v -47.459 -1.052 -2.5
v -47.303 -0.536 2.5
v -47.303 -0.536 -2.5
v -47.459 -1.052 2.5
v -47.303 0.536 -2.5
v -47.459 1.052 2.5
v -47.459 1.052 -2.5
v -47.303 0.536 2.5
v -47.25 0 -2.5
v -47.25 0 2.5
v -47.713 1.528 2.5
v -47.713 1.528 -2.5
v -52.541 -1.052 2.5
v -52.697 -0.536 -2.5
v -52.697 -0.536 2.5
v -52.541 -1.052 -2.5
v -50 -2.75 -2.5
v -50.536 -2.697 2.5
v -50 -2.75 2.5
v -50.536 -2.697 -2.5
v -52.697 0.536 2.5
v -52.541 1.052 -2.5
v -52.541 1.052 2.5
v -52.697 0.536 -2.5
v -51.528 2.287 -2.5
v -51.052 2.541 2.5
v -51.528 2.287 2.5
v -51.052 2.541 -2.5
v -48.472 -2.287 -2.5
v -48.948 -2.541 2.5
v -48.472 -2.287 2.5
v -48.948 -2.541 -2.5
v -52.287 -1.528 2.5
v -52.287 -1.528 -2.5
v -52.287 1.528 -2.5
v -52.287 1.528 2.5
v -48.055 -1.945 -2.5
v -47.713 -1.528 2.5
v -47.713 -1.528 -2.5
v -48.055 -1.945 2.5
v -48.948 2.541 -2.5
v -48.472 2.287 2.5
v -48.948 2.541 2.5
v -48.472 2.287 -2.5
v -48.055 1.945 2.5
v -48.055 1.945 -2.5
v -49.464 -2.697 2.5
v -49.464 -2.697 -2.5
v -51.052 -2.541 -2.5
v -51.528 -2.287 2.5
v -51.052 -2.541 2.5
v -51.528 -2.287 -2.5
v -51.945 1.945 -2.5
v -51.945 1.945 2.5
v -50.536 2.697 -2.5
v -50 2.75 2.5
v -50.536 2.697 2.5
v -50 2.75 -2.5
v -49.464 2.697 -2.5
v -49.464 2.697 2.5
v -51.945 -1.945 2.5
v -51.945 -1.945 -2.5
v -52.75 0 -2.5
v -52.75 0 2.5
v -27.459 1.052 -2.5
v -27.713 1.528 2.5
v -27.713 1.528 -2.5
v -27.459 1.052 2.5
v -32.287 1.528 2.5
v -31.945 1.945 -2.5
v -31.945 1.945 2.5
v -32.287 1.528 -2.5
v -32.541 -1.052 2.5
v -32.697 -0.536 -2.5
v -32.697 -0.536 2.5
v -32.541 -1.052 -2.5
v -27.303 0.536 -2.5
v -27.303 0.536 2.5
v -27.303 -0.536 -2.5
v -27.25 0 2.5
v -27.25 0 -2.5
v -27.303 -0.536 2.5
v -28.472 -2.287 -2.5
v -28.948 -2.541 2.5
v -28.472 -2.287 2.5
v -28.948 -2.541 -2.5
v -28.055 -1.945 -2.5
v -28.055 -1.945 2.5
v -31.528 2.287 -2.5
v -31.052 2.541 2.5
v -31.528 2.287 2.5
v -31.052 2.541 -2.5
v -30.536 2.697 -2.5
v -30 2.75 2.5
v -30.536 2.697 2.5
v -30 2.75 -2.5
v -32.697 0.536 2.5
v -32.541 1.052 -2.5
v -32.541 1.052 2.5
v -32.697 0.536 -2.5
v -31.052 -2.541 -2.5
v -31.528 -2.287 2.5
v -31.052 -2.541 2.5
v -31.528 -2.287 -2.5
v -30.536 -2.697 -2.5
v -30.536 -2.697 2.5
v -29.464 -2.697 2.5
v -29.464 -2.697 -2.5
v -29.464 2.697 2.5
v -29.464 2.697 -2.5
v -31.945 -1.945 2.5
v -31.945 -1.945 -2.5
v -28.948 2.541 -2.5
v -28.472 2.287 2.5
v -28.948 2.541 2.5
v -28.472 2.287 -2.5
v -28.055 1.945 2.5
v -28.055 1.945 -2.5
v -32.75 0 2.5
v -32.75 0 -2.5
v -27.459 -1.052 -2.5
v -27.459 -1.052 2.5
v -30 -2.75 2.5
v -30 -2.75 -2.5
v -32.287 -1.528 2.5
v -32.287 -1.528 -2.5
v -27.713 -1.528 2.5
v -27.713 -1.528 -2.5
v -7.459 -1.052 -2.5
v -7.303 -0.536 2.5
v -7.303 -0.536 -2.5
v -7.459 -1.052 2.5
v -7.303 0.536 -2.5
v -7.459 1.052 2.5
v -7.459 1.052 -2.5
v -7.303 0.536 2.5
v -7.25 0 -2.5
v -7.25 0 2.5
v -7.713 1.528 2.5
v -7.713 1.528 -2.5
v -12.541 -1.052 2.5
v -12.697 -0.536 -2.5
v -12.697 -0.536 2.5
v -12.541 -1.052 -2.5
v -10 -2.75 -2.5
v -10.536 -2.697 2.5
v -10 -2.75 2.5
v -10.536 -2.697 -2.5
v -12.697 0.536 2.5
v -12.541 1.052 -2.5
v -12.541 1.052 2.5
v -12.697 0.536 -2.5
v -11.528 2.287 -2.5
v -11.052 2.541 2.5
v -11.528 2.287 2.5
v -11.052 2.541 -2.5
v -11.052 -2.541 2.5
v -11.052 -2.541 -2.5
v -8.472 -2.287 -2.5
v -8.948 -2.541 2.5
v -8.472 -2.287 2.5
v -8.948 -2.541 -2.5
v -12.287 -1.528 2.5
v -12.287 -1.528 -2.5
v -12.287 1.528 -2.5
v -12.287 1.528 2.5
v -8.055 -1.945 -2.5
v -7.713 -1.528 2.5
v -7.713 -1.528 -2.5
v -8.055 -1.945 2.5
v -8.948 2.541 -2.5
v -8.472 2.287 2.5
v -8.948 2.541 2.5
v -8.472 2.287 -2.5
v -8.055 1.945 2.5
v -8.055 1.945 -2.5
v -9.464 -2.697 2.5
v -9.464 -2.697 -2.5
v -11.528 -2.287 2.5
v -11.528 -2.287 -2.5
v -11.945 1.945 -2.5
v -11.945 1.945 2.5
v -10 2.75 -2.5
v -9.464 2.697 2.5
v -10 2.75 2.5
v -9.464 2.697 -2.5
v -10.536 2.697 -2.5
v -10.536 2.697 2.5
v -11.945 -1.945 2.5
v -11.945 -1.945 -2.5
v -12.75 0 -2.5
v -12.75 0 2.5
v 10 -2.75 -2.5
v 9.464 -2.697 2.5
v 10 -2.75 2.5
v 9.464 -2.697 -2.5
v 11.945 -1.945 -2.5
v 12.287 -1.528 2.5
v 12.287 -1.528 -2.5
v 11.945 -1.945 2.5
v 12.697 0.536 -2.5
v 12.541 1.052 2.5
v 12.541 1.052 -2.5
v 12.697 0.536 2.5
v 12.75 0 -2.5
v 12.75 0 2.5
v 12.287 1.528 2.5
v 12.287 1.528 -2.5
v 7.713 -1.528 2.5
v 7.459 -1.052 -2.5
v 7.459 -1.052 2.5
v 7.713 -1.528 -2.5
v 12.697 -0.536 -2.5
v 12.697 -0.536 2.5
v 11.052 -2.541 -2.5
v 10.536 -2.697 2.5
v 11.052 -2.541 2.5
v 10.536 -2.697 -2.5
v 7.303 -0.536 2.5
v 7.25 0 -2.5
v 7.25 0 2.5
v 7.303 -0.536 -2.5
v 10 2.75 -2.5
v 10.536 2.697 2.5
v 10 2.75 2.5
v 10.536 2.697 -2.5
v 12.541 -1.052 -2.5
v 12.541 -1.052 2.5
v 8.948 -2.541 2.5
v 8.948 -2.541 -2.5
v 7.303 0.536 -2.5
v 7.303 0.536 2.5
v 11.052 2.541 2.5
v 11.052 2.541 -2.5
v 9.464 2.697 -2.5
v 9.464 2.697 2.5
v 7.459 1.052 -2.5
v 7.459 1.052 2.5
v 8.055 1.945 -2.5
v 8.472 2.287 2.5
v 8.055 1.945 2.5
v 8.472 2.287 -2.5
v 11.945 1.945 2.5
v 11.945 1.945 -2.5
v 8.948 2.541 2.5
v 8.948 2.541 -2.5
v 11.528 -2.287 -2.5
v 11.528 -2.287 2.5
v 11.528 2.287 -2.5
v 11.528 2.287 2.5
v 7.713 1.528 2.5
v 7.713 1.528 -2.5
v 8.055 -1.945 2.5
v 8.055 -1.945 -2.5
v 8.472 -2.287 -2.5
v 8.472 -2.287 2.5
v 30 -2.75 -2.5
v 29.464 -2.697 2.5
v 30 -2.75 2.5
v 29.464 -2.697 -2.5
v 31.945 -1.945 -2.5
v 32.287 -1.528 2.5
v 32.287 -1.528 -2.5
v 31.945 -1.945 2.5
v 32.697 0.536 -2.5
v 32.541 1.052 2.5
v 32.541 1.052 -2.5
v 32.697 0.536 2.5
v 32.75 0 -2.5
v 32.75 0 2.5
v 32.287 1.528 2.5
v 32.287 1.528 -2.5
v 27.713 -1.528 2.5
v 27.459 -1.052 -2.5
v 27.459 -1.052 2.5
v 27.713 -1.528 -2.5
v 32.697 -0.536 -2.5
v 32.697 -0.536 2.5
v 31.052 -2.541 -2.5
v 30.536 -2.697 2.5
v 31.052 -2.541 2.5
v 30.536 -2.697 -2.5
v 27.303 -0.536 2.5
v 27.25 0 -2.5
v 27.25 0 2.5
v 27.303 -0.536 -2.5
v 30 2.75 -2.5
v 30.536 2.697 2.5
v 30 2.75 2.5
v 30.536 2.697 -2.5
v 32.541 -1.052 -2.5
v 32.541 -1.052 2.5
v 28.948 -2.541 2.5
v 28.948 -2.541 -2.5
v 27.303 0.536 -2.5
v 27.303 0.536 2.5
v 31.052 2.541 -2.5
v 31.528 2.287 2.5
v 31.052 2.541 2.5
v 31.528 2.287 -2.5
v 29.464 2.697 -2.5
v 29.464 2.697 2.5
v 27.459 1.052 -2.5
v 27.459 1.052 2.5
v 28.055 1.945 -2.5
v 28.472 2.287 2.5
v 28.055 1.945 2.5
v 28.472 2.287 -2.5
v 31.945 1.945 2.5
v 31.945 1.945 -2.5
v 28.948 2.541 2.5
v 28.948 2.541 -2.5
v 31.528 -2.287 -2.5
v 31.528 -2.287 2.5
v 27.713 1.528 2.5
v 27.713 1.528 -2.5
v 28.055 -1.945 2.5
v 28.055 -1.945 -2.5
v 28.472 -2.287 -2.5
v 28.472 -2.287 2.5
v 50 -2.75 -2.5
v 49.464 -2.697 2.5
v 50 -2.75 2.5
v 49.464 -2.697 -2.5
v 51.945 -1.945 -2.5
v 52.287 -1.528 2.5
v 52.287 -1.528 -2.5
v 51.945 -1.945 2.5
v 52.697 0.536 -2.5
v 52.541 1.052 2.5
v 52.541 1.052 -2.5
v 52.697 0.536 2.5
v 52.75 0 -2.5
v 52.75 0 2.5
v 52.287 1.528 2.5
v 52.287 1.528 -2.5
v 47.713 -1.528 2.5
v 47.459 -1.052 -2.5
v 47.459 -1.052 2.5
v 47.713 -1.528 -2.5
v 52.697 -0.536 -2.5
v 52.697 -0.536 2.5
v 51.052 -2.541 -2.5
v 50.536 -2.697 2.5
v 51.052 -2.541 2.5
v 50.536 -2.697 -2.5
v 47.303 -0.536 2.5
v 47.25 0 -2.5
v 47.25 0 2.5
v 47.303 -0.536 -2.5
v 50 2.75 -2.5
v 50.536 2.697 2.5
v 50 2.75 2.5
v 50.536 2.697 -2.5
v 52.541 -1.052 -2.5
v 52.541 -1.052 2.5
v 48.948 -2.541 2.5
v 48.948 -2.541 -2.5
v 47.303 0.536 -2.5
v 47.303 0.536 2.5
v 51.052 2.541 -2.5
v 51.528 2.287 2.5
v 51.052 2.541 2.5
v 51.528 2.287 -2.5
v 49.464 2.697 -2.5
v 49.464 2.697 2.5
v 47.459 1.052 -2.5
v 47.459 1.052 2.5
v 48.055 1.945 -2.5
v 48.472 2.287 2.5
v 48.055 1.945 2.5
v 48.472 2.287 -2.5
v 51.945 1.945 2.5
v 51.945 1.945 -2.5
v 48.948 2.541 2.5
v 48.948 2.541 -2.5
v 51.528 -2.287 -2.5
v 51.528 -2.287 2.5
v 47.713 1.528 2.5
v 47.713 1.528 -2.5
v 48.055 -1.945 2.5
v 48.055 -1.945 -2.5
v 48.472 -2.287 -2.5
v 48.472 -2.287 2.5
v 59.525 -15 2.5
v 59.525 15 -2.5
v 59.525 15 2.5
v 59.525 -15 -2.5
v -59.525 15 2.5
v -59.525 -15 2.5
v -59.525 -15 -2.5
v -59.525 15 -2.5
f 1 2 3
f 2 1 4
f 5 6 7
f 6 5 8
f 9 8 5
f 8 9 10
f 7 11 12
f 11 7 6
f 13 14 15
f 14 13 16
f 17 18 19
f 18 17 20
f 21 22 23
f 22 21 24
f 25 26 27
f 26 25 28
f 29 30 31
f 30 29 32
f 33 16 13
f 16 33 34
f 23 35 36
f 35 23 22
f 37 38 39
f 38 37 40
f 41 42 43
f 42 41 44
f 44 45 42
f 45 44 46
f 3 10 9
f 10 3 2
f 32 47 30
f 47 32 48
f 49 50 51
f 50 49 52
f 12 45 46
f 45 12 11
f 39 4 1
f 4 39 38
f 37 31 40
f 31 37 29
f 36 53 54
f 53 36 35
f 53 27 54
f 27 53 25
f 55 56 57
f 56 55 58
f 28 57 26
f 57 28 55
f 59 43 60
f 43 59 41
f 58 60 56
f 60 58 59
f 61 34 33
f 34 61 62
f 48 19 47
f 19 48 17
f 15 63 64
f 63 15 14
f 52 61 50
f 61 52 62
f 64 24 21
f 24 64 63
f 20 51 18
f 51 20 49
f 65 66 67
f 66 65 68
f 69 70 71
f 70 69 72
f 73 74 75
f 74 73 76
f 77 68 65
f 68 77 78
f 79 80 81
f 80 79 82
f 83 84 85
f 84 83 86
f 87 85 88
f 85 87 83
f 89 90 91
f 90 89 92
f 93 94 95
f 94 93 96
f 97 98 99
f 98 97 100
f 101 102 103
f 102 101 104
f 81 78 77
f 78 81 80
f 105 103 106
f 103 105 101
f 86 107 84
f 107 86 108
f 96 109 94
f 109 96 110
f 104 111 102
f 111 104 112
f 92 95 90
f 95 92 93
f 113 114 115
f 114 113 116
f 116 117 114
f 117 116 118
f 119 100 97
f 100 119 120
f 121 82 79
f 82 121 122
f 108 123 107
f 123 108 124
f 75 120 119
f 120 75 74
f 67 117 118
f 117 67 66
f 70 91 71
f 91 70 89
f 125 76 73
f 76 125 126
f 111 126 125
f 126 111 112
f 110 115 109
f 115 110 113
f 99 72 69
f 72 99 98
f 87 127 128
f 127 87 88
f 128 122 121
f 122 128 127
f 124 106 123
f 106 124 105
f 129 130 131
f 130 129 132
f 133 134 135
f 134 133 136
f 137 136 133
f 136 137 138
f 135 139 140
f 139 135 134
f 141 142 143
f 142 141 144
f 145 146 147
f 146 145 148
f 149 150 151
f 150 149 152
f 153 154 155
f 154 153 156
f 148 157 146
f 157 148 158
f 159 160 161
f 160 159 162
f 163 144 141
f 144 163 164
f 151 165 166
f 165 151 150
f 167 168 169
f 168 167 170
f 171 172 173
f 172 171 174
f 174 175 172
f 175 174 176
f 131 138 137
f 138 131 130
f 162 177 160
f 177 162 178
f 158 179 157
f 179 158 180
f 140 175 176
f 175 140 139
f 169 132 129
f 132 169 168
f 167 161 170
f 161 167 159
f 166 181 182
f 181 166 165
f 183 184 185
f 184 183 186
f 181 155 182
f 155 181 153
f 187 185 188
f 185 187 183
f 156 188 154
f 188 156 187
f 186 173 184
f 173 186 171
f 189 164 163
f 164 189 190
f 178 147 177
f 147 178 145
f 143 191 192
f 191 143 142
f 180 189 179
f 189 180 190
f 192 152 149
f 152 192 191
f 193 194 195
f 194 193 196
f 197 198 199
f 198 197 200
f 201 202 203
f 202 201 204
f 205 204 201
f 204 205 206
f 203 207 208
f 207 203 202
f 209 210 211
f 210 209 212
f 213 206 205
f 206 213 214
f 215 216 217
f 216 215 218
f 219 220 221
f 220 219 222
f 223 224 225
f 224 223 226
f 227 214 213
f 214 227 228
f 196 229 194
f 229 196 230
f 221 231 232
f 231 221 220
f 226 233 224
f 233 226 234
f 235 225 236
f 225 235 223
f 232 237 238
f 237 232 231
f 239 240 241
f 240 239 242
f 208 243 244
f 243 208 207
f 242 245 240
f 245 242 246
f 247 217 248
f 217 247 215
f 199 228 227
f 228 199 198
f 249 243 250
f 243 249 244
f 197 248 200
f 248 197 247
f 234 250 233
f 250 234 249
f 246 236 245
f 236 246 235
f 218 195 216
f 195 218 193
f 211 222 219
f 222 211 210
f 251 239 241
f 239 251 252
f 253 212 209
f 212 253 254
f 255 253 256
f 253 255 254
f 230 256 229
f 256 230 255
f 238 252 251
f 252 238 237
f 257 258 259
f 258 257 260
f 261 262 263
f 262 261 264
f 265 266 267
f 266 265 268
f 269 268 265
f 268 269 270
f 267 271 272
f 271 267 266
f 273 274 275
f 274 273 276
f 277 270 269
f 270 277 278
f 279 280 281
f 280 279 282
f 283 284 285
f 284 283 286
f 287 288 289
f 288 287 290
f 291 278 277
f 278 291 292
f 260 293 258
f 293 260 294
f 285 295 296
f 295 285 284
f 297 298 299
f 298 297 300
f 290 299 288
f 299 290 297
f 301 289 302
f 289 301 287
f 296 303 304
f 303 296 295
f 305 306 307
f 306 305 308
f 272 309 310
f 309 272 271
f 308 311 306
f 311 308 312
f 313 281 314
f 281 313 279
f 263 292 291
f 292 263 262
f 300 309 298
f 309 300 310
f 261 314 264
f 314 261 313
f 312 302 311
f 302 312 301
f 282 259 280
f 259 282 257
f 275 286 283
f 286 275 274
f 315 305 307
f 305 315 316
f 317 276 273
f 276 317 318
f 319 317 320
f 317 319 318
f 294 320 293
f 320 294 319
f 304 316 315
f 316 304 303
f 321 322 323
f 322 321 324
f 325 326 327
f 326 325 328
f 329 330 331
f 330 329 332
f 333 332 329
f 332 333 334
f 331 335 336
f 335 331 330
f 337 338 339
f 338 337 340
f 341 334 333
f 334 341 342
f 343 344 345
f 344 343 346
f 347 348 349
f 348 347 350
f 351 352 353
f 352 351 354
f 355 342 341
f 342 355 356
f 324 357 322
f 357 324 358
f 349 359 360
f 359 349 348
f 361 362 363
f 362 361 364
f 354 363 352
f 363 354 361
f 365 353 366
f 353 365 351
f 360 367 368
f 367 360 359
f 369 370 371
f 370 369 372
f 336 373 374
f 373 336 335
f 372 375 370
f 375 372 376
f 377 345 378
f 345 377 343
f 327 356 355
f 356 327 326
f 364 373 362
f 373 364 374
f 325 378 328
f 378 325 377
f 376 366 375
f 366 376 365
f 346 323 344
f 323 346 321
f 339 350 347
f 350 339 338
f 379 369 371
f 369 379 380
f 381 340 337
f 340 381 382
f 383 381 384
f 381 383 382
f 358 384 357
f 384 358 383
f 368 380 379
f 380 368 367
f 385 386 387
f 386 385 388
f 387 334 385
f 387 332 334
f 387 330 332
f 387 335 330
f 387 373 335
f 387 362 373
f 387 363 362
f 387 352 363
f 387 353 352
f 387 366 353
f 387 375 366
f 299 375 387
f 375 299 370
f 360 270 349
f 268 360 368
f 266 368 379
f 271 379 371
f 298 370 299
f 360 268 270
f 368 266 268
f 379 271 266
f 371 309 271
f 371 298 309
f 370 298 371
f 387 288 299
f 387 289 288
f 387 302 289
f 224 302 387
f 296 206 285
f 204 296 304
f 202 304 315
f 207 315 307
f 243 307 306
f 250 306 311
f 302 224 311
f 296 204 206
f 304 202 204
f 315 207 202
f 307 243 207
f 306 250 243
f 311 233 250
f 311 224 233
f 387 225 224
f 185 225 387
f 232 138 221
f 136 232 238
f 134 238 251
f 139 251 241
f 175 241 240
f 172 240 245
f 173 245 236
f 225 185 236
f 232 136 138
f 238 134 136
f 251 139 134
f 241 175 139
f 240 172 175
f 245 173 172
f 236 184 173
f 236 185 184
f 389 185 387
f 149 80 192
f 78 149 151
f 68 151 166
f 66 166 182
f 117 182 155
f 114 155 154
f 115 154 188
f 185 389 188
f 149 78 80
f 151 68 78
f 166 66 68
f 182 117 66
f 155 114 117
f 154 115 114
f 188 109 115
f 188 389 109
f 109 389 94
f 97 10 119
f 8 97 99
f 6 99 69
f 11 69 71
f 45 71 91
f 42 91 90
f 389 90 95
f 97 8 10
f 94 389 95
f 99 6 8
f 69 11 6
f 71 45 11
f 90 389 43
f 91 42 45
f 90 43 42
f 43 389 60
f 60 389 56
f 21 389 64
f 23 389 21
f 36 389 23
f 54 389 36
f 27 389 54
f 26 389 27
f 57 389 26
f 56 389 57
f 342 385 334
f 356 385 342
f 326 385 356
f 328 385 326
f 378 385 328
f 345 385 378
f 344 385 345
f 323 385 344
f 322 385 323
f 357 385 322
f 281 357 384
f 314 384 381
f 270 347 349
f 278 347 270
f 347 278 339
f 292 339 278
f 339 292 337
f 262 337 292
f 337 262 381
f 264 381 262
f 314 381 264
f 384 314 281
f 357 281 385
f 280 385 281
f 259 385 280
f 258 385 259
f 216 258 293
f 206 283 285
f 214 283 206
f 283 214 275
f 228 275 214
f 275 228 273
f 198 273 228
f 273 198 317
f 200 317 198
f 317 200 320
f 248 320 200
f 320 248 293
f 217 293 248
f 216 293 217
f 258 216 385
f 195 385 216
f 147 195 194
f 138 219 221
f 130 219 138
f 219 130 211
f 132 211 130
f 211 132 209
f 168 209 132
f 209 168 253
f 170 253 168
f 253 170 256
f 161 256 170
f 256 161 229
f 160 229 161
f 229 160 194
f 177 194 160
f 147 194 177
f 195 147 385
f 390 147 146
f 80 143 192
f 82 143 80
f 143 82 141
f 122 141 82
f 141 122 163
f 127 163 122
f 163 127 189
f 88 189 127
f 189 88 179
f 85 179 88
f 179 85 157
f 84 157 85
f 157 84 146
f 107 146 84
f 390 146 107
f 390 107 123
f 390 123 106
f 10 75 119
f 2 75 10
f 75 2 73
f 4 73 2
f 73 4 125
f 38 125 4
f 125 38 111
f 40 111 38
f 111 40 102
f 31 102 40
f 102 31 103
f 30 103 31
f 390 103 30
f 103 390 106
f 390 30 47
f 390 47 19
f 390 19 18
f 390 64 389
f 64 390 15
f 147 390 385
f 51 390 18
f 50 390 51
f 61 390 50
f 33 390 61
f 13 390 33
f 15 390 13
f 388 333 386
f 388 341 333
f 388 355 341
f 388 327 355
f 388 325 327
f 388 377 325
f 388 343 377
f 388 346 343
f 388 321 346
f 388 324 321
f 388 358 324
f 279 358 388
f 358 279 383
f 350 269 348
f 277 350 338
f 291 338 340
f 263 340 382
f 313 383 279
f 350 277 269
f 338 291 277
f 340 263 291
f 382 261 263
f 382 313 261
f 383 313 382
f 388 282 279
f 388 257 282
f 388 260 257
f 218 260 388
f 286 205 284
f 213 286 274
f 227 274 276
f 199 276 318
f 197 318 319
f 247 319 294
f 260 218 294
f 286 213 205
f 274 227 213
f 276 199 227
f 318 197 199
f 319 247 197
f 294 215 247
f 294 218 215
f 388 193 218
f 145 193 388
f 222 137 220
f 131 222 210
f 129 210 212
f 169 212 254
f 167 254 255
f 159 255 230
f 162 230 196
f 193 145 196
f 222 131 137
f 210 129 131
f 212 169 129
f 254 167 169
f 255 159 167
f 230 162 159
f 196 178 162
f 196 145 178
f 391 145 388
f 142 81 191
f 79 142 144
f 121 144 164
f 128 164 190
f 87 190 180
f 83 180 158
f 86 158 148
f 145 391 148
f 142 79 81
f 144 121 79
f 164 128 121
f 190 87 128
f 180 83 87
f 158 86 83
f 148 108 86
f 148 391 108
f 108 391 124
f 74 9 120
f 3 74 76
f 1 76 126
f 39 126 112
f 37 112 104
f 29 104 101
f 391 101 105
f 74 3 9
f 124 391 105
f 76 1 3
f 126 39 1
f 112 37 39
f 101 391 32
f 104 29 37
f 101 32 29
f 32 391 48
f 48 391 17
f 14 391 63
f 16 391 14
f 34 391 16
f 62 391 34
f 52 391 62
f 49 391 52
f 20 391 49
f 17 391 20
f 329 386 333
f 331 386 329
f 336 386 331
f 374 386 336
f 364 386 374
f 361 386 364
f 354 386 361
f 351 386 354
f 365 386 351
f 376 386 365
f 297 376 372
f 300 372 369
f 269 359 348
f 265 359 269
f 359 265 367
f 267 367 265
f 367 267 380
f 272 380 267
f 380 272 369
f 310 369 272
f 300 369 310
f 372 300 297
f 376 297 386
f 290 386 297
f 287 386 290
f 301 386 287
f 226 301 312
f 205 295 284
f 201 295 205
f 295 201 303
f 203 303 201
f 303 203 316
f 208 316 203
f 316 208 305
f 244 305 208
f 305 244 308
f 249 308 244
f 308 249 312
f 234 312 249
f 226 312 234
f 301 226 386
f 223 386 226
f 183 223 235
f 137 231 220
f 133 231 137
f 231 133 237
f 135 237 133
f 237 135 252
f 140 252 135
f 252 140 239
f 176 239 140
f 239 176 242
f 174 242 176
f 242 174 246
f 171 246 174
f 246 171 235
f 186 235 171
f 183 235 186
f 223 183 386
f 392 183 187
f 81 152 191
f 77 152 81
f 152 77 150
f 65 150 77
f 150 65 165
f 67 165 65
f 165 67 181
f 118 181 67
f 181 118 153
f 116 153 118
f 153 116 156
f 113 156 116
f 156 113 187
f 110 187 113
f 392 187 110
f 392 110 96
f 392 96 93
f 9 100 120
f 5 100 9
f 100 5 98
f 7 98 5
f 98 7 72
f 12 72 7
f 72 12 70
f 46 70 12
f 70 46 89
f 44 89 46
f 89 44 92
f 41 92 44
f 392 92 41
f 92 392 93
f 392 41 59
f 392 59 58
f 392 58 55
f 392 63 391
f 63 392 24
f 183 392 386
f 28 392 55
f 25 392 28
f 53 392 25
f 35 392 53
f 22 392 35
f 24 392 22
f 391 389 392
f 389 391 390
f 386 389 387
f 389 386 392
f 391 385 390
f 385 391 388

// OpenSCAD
$fn = 32;

// ----------------------------------------------------------------------
// Hole bar, 6 x Ø5.5
// row layout, 9.525 mm edge offset
// ----------------------------------------------------------------------

// --- parameters (mm) ---
bar_w = 30;    // bar width (Y)
bar_t = 5;     // bar thickness (Z)
holes = 6;     // holes per row
hole_d = 5.5;  // hole diameter
edge = 9.525;  // offset from the bar end to the first hole
pitch = 20;    // pitch between neighbouring holes

// --- derived feature positions (mm) ---
span = (holes - 1) * pitch;   // = 100   distance between the end holes
bar_l = span + 2 * edge;      // = 119.05   overall bar length
start_x = -bar_l / 2 + edge;  // = -50   X of the first hole
feature_centers = [
  [start_x + 0 * pitch, 0],
  [start_x + 1 * pitch, 0],
  [start_x + 2 * pitch, 0],
  [start_x + 3 * pitch, 0],
  [start_x + 4 * pitch, 0],
  [start_x + 5 * pitch, 0]
];   // hole centres of the first row

// bar with one row of holes, drilled from feature_centers
difference() {
  translate([-bar_l / 2, -bar_w / 2, -bar_t / 2]) cube([bar_l, bar_w, bar_t]);
  for (centre = feature_centers)
    translate([centre[0], centre[1], 0])
      cylinder(d = hole_d, h = bar_t + 2, center = true);
}
